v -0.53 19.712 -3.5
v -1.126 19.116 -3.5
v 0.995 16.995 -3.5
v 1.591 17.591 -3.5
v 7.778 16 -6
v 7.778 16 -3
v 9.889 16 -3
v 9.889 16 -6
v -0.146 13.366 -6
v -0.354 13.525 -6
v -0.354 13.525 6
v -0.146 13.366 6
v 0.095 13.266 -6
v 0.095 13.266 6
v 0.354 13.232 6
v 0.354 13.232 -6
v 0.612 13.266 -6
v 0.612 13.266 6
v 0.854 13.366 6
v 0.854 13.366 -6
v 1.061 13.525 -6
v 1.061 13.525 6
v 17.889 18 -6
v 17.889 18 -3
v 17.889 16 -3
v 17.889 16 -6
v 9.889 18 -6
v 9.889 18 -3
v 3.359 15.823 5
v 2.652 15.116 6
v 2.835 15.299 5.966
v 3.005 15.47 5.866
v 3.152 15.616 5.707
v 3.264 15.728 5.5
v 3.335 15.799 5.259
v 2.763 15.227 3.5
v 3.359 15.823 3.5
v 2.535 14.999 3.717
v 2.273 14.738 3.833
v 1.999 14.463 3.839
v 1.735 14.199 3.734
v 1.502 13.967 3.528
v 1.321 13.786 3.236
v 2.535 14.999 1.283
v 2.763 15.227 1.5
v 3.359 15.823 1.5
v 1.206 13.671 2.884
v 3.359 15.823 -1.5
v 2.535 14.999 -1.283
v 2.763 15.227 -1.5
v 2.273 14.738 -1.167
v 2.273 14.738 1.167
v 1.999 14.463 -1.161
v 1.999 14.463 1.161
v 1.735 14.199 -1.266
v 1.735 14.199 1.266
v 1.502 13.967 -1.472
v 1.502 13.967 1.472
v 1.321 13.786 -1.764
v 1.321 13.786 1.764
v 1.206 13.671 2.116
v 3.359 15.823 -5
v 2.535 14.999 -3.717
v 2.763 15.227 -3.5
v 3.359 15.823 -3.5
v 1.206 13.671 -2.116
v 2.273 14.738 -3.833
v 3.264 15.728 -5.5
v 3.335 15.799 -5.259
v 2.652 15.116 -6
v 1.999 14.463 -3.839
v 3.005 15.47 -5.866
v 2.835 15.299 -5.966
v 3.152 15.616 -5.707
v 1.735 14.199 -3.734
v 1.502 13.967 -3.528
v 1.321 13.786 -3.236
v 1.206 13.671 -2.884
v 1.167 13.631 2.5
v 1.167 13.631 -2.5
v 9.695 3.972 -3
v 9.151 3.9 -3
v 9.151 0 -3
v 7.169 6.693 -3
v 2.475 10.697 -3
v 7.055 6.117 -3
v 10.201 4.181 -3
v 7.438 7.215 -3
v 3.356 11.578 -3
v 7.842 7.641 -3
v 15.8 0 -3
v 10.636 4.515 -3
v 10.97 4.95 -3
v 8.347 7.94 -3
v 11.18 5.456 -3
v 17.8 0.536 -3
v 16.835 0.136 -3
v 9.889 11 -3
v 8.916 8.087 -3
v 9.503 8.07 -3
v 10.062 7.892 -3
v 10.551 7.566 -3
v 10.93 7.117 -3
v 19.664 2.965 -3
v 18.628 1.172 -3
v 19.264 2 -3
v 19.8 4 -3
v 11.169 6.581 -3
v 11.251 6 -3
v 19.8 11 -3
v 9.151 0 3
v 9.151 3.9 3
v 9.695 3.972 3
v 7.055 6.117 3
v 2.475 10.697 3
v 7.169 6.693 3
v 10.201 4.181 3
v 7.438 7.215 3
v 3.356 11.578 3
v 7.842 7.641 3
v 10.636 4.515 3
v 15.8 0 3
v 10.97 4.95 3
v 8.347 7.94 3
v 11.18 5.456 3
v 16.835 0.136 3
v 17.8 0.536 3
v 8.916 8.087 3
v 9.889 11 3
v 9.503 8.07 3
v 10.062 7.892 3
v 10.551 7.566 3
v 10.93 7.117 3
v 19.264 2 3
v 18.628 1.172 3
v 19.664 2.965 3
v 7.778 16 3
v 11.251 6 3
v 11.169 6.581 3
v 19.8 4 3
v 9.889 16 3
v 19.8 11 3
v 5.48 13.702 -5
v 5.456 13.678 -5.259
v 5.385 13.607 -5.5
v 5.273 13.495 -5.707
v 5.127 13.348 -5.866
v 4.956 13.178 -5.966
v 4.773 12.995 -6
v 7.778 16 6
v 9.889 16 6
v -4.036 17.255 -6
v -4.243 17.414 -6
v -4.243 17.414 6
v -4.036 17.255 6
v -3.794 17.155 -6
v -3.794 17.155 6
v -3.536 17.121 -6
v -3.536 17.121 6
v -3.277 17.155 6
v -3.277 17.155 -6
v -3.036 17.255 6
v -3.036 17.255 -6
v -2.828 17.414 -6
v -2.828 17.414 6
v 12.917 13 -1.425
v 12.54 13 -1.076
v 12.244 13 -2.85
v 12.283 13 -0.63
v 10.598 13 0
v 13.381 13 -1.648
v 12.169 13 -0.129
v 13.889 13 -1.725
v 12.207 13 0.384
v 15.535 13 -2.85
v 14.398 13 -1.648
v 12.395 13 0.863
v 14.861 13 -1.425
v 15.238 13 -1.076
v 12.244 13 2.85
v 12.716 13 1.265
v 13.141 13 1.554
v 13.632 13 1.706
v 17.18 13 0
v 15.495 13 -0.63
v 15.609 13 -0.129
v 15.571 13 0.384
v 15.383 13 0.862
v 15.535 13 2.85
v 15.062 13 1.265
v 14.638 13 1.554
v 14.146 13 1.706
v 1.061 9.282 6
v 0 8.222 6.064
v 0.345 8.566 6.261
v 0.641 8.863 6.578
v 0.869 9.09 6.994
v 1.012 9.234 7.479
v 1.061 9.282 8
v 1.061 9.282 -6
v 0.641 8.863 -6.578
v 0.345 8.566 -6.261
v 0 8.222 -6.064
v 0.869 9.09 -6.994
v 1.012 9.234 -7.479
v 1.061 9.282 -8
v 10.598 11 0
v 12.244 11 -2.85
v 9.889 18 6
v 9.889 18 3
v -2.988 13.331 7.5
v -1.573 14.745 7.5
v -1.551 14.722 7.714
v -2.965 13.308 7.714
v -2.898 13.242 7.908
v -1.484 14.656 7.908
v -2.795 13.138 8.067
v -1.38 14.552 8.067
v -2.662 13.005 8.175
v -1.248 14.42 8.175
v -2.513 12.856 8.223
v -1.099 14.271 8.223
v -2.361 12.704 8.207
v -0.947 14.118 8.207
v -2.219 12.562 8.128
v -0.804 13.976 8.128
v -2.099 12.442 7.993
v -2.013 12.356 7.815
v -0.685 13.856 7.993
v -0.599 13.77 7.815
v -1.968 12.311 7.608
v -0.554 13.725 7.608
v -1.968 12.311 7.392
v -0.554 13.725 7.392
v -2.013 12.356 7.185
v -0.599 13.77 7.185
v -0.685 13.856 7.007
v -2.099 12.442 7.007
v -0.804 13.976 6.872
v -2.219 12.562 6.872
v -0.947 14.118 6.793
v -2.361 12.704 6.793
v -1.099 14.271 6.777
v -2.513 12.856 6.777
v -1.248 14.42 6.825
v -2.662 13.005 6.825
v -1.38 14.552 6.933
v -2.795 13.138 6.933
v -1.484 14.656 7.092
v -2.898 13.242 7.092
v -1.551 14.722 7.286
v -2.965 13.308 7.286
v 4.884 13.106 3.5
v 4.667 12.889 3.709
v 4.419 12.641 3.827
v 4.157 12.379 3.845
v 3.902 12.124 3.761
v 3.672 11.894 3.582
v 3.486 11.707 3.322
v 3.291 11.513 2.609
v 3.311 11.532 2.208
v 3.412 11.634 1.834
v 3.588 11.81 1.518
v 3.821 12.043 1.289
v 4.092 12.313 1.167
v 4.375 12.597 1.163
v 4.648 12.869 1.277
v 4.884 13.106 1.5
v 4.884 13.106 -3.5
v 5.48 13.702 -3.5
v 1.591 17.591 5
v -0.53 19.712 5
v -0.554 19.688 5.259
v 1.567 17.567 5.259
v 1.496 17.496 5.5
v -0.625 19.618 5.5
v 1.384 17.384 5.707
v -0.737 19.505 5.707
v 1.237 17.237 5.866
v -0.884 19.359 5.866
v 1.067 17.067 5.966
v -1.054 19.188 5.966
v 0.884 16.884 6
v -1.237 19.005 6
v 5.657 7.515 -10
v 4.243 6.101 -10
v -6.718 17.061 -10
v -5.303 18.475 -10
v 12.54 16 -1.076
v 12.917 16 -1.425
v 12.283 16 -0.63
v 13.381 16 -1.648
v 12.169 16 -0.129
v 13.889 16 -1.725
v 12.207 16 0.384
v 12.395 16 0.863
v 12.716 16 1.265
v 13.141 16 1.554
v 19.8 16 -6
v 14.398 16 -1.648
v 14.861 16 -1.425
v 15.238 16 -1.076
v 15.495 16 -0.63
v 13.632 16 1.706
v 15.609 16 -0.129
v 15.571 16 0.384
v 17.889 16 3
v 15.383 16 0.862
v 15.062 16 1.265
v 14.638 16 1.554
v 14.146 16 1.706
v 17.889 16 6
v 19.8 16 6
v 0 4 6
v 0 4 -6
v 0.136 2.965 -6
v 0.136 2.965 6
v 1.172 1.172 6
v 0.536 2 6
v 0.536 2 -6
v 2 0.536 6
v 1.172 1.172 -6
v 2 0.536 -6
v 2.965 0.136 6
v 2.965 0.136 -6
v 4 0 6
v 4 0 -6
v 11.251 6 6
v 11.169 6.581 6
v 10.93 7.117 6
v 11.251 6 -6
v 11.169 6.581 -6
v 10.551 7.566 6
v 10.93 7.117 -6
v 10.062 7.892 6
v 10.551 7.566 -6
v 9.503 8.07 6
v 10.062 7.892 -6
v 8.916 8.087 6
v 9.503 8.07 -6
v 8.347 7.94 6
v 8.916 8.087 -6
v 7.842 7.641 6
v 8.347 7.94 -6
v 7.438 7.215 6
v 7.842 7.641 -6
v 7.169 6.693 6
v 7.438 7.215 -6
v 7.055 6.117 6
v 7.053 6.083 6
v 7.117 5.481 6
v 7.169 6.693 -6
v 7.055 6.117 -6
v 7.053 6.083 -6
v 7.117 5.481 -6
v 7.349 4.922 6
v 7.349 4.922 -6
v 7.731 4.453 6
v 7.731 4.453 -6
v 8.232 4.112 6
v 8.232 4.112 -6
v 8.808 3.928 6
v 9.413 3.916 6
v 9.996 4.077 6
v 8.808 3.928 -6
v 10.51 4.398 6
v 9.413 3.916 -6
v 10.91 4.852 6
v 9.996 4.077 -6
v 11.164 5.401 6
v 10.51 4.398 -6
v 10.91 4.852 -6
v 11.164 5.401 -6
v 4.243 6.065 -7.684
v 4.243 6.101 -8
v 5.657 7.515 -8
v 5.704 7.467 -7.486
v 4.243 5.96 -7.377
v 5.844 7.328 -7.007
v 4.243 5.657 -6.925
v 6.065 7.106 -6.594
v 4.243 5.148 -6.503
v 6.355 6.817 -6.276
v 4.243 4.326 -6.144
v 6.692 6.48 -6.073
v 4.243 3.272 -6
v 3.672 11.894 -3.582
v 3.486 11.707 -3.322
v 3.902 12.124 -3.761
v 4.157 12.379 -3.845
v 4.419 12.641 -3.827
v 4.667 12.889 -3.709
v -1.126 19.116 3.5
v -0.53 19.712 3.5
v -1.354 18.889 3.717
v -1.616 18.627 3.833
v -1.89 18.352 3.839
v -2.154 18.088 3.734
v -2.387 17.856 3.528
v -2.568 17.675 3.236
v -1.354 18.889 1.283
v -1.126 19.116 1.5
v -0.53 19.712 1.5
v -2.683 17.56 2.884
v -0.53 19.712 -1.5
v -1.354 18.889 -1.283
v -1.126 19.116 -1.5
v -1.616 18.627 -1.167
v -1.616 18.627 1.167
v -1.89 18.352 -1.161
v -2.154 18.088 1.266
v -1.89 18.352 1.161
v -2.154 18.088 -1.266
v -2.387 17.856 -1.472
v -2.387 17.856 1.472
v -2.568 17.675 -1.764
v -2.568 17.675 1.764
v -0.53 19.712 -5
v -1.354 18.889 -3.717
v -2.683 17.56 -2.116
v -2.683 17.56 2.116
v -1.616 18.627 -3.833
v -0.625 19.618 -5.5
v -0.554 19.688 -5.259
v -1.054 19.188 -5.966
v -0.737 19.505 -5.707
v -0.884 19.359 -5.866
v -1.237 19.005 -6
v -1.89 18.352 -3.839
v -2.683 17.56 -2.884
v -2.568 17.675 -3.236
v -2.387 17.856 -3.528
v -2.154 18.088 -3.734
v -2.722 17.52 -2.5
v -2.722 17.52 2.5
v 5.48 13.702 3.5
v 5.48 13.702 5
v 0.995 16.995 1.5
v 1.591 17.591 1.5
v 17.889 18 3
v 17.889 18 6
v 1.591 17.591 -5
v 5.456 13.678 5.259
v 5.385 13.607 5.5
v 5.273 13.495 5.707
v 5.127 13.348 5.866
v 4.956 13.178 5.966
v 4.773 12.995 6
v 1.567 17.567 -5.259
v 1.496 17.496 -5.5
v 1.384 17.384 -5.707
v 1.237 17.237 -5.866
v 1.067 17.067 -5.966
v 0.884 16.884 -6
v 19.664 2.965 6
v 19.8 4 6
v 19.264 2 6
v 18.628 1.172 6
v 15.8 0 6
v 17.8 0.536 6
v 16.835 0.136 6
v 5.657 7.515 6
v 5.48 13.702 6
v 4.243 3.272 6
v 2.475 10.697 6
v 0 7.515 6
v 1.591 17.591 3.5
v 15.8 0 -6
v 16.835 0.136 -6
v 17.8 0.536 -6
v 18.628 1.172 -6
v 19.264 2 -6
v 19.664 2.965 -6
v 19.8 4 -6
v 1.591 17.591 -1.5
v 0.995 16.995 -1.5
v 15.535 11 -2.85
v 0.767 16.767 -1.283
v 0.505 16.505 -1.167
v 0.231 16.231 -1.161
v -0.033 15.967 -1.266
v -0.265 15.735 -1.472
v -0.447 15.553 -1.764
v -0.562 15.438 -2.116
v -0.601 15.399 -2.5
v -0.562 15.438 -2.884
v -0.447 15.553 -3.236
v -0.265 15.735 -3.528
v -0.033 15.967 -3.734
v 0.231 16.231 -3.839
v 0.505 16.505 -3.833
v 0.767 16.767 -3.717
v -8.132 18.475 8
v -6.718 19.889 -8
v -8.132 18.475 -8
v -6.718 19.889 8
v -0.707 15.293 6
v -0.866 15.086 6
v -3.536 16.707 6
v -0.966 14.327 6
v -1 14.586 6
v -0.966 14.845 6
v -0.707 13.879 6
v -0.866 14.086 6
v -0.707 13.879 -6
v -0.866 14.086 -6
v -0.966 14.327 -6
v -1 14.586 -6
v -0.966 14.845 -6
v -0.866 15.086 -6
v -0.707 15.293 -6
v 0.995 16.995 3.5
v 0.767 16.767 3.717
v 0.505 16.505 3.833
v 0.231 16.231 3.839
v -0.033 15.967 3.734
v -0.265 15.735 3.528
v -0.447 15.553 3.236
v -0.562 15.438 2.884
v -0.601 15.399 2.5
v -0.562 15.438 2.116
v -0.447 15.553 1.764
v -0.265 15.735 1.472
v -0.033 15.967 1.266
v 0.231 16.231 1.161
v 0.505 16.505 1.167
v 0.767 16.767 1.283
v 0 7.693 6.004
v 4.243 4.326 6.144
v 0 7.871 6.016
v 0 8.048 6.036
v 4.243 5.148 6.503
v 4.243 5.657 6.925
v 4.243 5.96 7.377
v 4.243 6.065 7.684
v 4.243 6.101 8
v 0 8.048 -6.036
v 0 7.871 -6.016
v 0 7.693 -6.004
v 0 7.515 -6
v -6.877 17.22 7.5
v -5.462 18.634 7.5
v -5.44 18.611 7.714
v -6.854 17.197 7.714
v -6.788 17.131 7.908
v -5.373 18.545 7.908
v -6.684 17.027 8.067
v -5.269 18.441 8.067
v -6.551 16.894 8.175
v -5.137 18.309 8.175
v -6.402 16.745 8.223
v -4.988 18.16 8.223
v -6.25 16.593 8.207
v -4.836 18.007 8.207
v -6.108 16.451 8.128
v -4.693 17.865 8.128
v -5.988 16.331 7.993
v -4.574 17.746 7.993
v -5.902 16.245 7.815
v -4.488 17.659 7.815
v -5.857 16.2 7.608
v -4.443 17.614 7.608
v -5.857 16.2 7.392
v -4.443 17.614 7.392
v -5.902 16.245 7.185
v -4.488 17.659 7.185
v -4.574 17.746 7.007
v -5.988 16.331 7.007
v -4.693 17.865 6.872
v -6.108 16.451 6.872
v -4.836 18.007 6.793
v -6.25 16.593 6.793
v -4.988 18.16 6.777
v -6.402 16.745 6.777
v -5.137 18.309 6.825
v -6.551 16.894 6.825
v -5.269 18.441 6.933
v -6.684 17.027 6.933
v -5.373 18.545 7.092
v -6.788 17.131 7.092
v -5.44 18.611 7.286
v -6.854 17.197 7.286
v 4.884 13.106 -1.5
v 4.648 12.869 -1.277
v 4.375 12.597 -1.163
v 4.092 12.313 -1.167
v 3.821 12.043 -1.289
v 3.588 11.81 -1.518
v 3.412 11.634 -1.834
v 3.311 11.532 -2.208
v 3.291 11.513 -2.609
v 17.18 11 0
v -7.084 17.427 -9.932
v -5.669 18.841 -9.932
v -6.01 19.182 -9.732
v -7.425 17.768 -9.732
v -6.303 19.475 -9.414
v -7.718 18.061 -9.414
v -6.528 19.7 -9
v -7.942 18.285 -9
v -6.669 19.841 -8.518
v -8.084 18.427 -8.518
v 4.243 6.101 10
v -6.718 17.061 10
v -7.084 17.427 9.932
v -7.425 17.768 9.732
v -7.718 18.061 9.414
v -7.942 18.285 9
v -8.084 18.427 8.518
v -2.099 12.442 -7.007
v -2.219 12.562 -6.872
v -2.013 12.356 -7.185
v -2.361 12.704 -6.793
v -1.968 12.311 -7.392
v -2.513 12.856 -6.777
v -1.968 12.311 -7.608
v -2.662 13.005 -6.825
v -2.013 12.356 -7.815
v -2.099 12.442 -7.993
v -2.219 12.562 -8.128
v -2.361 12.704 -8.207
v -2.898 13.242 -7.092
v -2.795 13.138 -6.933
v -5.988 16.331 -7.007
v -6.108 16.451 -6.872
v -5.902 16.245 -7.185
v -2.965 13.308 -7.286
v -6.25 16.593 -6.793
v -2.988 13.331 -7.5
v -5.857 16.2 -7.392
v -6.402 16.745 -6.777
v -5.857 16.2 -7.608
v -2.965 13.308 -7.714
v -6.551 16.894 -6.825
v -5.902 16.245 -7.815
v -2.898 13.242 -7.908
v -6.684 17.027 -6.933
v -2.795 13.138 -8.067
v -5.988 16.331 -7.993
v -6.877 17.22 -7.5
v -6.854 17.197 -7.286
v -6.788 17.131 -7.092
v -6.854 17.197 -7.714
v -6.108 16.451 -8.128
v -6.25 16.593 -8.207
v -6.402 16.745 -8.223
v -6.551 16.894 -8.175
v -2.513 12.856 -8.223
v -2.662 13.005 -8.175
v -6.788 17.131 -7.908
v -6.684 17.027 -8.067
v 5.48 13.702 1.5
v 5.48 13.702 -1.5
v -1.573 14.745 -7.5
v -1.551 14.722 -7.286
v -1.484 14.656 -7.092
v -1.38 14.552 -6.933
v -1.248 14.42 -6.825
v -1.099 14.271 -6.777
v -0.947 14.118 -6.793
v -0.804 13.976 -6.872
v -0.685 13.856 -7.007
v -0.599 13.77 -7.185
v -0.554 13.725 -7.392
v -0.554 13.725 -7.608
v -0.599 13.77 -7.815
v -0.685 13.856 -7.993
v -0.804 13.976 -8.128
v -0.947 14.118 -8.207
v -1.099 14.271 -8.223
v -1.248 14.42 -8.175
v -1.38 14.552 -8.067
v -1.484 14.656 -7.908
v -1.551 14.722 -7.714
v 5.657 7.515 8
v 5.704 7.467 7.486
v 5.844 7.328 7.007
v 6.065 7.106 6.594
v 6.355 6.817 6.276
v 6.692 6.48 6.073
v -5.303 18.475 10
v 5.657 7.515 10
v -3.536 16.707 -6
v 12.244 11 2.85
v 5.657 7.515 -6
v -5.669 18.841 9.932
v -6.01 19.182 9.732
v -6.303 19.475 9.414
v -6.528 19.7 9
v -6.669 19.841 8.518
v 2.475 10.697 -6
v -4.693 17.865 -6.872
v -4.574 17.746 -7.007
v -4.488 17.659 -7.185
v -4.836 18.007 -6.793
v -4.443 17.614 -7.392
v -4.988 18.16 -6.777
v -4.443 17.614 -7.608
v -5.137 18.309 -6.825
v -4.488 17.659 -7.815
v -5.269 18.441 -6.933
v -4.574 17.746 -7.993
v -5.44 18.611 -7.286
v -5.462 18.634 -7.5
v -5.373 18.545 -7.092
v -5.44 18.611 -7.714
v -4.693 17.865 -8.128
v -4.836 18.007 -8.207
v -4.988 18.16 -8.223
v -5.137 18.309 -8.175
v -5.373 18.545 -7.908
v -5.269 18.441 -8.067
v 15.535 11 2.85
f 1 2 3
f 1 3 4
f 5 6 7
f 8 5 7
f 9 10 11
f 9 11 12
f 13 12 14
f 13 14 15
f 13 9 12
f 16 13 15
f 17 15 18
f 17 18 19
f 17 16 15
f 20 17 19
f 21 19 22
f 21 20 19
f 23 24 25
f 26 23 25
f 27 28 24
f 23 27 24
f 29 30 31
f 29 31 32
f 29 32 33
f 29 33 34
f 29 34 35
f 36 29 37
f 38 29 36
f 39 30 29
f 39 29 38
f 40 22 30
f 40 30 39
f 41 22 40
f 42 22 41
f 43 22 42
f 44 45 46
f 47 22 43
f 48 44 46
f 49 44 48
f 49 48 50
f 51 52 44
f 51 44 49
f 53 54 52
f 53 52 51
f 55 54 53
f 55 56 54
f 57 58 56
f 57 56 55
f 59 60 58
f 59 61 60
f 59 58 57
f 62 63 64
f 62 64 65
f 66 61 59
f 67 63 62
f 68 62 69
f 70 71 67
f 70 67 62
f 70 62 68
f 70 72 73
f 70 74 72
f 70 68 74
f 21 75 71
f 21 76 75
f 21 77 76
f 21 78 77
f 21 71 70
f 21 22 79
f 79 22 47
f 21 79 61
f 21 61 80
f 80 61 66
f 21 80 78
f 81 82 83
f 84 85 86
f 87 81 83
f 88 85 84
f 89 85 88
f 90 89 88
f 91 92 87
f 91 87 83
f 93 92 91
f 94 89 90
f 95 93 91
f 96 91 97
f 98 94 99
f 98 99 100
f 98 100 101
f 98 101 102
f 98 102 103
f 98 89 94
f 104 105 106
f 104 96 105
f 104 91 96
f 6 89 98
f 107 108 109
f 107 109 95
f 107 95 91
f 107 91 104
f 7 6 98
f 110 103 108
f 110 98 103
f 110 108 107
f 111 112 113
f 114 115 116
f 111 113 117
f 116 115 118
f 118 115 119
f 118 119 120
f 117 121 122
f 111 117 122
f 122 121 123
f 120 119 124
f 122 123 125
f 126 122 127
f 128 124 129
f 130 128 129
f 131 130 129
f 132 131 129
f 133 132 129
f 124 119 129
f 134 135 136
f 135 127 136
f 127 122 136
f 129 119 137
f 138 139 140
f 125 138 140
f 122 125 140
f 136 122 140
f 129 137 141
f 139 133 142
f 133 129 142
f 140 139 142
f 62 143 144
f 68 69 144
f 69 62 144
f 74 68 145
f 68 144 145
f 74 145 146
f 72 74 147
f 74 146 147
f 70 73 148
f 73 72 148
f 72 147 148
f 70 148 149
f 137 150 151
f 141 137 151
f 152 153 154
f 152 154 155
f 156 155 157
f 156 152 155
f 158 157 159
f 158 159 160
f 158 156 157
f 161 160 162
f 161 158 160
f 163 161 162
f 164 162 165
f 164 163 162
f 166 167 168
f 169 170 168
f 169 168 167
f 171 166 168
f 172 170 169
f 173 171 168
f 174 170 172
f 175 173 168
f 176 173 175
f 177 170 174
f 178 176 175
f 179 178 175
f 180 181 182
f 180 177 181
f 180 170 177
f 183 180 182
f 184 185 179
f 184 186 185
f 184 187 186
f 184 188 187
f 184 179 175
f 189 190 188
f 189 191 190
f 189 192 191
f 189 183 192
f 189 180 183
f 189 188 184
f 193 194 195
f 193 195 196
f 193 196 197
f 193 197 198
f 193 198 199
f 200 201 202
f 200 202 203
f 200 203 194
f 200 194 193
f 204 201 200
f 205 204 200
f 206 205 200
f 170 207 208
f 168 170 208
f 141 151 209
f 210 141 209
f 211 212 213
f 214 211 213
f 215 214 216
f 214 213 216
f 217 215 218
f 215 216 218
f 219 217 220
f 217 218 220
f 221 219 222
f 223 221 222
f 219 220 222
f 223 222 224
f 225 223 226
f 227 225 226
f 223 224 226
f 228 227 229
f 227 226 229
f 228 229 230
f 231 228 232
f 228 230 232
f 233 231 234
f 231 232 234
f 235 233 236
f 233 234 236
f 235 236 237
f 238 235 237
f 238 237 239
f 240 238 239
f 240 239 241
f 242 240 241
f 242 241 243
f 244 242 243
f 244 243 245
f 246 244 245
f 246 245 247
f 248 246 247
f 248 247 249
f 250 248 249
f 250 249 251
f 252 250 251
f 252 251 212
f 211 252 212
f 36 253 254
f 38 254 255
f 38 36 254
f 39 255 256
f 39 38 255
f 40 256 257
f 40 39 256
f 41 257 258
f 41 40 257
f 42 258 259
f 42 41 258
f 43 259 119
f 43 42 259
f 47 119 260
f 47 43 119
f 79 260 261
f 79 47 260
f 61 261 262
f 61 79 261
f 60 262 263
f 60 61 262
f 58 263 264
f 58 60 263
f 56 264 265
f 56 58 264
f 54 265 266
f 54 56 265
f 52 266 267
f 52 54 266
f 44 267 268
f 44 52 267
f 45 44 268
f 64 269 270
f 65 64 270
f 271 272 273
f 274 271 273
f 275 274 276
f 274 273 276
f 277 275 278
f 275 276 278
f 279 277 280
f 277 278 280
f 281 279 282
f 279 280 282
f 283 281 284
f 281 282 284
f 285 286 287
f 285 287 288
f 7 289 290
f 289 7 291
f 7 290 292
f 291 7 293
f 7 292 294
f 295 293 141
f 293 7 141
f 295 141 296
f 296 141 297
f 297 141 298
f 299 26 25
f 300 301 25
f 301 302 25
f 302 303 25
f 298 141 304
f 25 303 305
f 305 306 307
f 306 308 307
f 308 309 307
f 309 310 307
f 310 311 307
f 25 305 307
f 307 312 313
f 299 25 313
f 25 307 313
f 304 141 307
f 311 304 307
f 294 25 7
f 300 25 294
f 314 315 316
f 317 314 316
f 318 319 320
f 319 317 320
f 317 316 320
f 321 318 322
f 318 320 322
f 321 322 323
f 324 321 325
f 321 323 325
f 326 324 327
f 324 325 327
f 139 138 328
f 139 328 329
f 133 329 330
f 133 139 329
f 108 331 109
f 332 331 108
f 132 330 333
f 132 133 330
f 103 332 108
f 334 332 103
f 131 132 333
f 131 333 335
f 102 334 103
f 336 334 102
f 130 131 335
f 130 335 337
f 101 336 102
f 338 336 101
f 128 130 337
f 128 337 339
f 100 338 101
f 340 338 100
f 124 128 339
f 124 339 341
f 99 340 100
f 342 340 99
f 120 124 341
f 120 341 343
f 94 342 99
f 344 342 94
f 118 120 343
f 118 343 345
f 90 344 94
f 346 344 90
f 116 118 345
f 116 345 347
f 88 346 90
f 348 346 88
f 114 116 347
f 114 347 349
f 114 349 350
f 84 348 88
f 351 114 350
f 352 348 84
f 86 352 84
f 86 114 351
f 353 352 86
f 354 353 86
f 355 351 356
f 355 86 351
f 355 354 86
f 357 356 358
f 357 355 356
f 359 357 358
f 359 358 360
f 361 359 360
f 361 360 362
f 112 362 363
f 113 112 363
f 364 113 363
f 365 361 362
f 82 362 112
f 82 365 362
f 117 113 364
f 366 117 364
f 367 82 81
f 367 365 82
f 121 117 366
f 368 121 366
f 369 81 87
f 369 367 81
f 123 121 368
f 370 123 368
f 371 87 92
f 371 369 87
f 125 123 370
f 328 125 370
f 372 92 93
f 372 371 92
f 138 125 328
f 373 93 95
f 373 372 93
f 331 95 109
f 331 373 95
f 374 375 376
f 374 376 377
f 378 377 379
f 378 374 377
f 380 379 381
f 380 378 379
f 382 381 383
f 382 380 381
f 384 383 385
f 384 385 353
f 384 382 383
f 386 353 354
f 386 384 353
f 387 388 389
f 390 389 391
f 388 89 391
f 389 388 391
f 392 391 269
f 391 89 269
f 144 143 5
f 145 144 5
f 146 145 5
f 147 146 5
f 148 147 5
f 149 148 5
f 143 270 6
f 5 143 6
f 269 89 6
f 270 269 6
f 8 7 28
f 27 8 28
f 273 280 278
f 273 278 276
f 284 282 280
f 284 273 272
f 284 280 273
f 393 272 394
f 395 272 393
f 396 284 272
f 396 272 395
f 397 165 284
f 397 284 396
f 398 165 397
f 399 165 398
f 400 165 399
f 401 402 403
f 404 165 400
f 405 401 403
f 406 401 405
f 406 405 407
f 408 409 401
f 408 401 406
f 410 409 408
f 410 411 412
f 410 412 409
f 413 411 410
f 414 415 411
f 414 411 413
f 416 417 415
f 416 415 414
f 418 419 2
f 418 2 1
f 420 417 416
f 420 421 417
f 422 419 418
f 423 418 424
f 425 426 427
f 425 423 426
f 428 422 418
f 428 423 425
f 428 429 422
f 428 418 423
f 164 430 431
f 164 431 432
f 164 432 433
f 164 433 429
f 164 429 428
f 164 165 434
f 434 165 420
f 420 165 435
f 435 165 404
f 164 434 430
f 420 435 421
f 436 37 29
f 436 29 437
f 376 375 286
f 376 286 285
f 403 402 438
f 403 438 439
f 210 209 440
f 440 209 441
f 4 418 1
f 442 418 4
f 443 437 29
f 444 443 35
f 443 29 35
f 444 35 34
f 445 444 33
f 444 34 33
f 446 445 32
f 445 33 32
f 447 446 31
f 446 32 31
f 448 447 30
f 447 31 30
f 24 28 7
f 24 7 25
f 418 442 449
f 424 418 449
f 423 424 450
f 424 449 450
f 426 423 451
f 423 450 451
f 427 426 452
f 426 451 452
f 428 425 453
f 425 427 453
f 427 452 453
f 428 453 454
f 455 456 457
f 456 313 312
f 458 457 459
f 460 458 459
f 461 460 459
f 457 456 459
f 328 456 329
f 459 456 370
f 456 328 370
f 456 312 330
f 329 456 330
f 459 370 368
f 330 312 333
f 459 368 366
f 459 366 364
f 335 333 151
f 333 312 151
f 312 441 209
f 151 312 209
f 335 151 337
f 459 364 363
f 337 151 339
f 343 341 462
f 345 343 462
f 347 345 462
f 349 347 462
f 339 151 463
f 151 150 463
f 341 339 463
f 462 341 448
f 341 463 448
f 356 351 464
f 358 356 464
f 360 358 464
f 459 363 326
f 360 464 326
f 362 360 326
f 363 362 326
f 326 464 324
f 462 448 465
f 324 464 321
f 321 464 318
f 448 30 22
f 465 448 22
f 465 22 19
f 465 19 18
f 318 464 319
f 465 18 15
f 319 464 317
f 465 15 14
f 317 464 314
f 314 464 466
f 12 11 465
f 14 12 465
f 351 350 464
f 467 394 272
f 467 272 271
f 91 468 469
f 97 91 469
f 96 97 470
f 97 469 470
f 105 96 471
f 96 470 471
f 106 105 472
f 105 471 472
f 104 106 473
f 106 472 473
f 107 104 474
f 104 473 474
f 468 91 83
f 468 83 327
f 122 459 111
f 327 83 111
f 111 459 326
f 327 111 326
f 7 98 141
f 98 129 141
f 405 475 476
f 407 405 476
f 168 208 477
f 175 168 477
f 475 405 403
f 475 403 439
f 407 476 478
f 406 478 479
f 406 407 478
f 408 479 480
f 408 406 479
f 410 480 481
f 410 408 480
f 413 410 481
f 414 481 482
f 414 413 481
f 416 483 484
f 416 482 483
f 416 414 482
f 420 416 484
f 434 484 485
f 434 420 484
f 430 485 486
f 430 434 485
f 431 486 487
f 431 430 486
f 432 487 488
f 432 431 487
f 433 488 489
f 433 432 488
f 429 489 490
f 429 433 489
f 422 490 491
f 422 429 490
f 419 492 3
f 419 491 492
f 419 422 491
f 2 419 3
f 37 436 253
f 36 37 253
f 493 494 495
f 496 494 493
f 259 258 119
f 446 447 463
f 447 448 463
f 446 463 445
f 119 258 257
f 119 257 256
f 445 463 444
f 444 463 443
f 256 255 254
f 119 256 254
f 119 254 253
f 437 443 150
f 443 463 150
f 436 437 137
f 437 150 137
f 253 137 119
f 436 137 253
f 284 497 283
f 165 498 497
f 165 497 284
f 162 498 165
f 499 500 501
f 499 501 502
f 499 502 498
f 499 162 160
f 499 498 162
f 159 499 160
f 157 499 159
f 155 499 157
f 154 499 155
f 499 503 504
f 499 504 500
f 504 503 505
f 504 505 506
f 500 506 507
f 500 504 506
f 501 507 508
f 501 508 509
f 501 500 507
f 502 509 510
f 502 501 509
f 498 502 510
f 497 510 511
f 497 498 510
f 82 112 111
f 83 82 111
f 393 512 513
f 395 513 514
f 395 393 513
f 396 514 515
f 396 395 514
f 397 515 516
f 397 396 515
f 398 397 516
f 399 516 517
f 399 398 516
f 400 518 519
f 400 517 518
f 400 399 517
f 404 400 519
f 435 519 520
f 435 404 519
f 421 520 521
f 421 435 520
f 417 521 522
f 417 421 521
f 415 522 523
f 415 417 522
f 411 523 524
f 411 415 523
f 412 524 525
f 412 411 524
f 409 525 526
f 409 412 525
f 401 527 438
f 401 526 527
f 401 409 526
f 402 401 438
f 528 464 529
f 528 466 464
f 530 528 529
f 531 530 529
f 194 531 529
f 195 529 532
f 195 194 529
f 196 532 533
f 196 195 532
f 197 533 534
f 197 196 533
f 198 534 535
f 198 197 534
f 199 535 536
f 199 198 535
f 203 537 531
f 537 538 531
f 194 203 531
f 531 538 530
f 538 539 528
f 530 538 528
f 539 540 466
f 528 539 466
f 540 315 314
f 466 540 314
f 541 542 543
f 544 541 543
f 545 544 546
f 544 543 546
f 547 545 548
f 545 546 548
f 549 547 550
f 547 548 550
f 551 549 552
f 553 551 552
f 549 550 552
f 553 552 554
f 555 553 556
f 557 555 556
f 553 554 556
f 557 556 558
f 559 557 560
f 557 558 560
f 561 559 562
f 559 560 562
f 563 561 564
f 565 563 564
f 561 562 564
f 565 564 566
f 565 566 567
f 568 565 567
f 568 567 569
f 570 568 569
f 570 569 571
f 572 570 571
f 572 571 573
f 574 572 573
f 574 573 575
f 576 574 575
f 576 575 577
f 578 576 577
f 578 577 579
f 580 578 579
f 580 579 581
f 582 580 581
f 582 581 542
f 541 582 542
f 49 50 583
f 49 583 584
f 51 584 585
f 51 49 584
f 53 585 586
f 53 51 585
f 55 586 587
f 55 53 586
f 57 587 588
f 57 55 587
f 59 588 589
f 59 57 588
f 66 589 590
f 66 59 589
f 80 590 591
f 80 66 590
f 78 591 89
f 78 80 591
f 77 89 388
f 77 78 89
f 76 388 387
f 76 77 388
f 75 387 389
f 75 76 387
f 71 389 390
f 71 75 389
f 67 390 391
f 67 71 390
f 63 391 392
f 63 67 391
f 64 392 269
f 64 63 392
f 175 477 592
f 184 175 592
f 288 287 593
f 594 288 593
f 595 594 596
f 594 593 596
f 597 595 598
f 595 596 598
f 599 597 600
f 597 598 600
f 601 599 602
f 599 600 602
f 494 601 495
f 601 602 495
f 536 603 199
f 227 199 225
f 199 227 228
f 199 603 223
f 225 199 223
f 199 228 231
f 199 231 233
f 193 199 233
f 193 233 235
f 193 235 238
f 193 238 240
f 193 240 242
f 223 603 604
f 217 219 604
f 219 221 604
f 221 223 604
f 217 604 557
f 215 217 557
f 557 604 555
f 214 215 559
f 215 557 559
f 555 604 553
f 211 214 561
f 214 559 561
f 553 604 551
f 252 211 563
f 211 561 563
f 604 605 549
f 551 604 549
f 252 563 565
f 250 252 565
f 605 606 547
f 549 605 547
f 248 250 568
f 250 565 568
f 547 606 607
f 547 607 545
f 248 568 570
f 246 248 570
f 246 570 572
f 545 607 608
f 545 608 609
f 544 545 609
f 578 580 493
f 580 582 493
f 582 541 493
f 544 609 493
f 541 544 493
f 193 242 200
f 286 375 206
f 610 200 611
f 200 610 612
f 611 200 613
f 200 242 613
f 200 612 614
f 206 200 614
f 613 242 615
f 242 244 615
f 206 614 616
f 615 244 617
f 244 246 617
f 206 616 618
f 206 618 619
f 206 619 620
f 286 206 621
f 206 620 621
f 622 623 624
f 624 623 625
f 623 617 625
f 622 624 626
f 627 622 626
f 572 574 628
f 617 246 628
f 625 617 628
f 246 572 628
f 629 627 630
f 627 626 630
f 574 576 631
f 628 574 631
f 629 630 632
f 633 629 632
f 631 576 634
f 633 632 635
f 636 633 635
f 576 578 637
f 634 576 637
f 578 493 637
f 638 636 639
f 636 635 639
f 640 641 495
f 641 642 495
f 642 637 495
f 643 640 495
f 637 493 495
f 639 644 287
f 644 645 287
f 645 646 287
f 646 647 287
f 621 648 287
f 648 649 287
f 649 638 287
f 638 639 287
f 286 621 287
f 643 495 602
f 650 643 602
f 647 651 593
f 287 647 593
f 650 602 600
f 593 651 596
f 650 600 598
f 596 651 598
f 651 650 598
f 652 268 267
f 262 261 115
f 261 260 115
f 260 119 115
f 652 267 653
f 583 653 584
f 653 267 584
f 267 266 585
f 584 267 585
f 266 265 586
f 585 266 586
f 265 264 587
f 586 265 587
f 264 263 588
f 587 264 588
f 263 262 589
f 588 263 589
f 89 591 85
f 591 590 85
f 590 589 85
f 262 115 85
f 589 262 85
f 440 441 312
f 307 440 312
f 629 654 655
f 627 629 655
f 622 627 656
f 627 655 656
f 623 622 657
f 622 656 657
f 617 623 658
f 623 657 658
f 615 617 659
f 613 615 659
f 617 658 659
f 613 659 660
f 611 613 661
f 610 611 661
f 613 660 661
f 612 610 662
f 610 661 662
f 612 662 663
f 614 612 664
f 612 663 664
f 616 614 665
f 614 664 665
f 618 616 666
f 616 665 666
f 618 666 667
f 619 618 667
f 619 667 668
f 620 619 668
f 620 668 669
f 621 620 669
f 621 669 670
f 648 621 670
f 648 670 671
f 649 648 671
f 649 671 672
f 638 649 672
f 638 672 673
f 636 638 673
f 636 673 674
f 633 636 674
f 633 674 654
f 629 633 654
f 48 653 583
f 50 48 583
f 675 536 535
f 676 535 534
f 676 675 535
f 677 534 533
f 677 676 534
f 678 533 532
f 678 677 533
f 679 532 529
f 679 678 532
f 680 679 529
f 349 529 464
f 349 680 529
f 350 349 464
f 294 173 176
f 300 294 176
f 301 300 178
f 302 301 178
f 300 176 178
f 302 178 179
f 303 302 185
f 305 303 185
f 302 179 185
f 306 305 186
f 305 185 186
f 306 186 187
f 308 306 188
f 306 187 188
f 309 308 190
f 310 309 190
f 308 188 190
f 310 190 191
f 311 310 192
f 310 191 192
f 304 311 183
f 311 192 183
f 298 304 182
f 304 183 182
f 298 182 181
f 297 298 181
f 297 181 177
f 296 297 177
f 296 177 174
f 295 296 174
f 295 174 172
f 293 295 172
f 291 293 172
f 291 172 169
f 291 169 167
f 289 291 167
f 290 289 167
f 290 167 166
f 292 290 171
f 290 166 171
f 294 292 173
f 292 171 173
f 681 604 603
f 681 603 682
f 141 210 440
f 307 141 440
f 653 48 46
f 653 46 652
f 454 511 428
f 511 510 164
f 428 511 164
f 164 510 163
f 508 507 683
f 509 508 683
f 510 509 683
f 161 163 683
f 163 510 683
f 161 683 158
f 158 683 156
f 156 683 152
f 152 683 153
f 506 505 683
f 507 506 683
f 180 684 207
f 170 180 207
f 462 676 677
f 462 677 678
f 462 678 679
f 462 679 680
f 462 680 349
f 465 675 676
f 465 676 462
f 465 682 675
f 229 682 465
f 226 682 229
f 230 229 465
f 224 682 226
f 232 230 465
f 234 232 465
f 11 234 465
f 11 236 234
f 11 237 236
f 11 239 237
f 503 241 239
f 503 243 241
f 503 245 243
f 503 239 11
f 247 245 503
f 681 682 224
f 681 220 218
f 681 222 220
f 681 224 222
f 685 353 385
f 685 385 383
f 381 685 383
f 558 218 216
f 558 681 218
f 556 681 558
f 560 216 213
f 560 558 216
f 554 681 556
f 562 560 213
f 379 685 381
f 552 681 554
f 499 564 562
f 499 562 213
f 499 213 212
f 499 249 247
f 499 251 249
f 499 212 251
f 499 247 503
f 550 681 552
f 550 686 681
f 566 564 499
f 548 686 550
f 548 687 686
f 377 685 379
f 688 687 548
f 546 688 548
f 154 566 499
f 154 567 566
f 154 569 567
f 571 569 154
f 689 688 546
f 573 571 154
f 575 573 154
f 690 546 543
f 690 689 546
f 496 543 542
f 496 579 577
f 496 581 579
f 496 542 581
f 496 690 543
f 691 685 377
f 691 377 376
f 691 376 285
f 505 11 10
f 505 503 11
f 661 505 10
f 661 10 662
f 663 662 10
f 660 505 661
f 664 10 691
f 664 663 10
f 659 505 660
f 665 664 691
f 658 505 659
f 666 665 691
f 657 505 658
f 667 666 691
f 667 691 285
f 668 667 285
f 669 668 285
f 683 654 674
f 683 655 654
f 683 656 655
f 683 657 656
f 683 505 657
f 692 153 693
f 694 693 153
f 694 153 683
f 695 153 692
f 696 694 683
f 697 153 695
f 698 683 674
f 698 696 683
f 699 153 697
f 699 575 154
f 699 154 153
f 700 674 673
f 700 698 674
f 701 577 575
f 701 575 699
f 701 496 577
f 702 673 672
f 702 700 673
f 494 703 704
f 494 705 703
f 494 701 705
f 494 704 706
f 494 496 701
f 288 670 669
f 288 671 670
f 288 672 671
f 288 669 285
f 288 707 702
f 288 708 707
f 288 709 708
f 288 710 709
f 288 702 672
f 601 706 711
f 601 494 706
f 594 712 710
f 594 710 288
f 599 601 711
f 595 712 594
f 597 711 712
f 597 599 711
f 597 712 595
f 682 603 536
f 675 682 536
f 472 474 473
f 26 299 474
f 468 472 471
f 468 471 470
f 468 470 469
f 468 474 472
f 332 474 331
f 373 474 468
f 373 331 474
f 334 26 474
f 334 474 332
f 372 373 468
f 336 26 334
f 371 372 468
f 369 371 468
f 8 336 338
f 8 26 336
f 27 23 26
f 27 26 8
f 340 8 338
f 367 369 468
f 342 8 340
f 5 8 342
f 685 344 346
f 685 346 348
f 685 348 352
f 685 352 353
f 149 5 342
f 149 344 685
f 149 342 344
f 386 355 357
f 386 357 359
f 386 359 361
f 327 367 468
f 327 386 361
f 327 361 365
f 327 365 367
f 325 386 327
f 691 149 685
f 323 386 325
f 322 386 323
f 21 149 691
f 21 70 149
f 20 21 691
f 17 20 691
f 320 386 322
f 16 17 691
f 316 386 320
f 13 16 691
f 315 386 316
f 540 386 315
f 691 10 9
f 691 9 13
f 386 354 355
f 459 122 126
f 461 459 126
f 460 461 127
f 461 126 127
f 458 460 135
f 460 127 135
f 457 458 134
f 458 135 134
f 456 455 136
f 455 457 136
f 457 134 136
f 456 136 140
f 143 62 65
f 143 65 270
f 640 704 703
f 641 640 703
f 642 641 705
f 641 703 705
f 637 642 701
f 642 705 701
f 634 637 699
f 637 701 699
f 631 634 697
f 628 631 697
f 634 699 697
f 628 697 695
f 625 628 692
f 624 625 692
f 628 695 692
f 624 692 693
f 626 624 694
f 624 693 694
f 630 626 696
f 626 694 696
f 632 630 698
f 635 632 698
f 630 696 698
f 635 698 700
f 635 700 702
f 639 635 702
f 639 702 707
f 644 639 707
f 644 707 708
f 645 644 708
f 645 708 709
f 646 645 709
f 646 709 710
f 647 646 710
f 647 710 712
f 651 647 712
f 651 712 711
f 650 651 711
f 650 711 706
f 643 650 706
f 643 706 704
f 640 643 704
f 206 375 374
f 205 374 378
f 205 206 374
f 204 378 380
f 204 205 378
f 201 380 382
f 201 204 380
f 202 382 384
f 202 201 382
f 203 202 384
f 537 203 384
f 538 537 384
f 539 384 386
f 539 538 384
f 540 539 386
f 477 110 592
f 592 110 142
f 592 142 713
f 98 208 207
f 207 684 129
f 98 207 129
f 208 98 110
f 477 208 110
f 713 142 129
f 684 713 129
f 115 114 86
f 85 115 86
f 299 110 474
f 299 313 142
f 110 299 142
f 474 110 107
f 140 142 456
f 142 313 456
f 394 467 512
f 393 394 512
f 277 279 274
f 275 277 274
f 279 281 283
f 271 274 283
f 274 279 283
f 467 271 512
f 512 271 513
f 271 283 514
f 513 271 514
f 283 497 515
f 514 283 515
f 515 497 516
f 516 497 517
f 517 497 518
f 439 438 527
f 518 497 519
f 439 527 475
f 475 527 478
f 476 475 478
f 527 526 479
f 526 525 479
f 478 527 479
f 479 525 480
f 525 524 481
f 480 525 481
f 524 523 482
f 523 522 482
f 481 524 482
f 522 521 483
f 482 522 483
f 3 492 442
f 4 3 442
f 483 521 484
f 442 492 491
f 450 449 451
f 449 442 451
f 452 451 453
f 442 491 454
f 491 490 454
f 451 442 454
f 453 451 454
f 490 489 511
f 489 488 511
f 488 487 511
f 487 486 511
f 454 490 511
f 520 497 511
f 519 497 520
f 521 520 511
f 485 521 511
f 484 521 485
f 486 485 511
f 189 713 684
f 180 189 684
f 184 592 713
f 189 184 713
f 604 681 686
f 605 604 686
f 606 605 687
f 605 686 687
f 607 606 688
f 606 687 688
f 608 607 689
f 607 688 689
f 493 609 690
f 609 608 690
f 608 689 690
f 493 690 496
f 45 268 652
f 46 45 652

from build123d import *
from build123d.topology import SkipClean

# Parameters (mm, degrees)
SKETCH1_R                        = 2.1
FINGER_BASE_1_DEPTH              = 6
SKETCH2_W                        = 20
SKETCH2_H                        = 2
FLEXURE_JOINT_BASE_DEPTH         = 13
SKETCH3_W                        = 8
SKETCH3_H                        = 2
PULLEY_HOUSING_DEPTH             = 3
M3_NUT_DEPTH                     = 2
SKETCH5_R                        = 1.725
M3_HOLE_DEPTH                    = 3
SKETCH9_W                        = 4
SKETCH9_H                        = 2
SUPPORT_FLEXURE_JOINT_BASE_DEPTH = 4.5
SKETCH10_R                       = 0.725
HOLE_FOR_STICHING_DEPTH          = 23.216728933
SKETCH11_W                       = 3
SKETCH11_H                       = 12
TUBE_PLATE_DEPTH                 = 4.25
TUBE_HOUSING_REACH               = 35.132
FINGER_BASE_CONTOURING_R         = 1
FINGER_BASE_CONTOURING_R_2       = 2
FINGER_BASE_CONTOURING_R_3       = 4


with BuildPart() as part:
    # Sketch1 → Finger Base 1 (new, symmetric)
    with BuildSketch(Plane.XY):
        Polygon((0, 8.221825407), (7.778174593, 16), (9.889087297, 16), (9.889087297, 18), (17.889087297, 18), (17.889087297, 16), (19.8, 16), (19.8, 0), (0, 0), align=None)
        with Locations((9.151471863, 6)):
            Circle(SKETCH1_R, mode=Mode.SUBTRACT)
    extrude(amount=FINGER_BASE_1_DEPTH, both=True)

    # Sketch2 → Flexure Joint Base (add)
    with BuildSketch(Plane(origin=(-4.110912703, 4.110912703, 0), x_dir=(0, 0, 1), z_dir=(-0.7071067811865462, 0.707106781186549, 0))):
        with Locations((0, 8.313708499)):
            Rectangle(SKETCH2_W, SKETCH2_H)
    extrude(amount=FLEXURE_JOINT_BASE_DEPTH)

    # Sketch3 → Pulley Housing (cut, symmetric)
    with SkipClean():  # the faces are left unmerged after this step: merging them gives an invalid solid
        with BuildSketch(Plane.XY):
            with BuildLine():
                ThreePointArc((7.054725188, 6.116847687), (7.62579494, 4.556978889), (9.151471863, 3.9))
                Line((9.151471863, 3.9), (9.151471863, 0))
                Line((9.151471863, 0), (19.8, 0))
                Line((19.8, 0), (19.8, 11))
                Line((19.8, 11), (9.889087297, 11))
                Line((9.889087297, 11), (9.889087297, 16))
                Line((9.889087297, 16), (7.778174593, 16))
                Line((7.778174593, 16), (2.474873734, 10.696699141))
                Line((2.474873734, 10.696699141), (7.054725188, 6.116847687))
            make_face()
            with Locations((13.889087297, 17)):
                Rectangle(SKETCH3_W, SKETCH3_H)
        extrude(amount=PULLEY_HOUSING_DEPTH, both=True, mode=Mode.SUBTRACT)
    add(part.part.scale(1), mode=Mode.REPLACE)  # the faces are merged on a copy

    # Sketch4 → M3 Nut (cut)
    with BuildSketch(Plane.XZ.offset(-11)):
        Polygon((10.598190762, 0), (12.243639029, -2.85), (15.534535564, -2.85), (17.179983831, 0), (15.534535564, 2.85), (12.243639029, 2.85), align=None)
    extrude(amount=-M3_NUT_DEPTH, mode=Mode.SUBTRACT)

    # Sketch5 → M3 Hole (cut)
    with BuildSketch(Plane.XZ.offset(-13)):
        with Locations(Location((13.889087297, 0, 0), (0, 0, 270))):
            Circle(SKETCH5_R)
    extrude(amount=-M3_HOLE_DEPTH, mode=Mode.SUBTRACT)

    # Sketch9 → Support Flexure Joint Base (add)
    with BuildSketch(Plane(origin=(-4.110912703, 4.110912703, 0), x_dir=(0, 0, -1), z_dir=(0.7071067811865462, -0.7071067811865488, 0))):
        with Locations((-8, 8.313708499)):
            Rectangle(SKETCH9_W, SKETCH9_H)
        with Locations((8, 8.313708499)):
            Rectangle(SKETCH9_W, SKETCH9_H)
    extrude(amount=SUPPORT_FLEXURE_JOINT_BASE_DEPTH)

    # Sketch10 → Hole For Stiching (cut, through all)
    with BuildSketch(Plane(origin=(6.585786438, 6.585786438, 0), x_dir=(0.7071067811865462, -0.707106781186549, 0), z_dir=(0.707106781186549, 0.7071067811865462, 0))):
        with Locations(Location((-16.313708499, -7.5, 0), (0, 0, 180))):
            Circle(SKETCH10_R)
        with Locations(Location((-10.813708499, -7.5, 0), (0, 0, 180))):
            Circle(SKETCH10_R)
        with Locations(Location((-10.813708499, 7.5, 0), (0, 0, 180))):
            Circle(SKETCH10_R)
        with Locations(Location((-16.313708499, 7.5, 0), (0, 0, 180))):
            Circle(SKETCH10_R)
    extrude(amount=-HOLE_FOR_STICHING_DEPTH, mode=Mode.SUBTRACT)

    # Sketch11 → Tube Plate (add)
    with BuildSketch(Plane(origin=(6.585786438, 6.585786438, 0), x_dir=(0.7071067811865462, -0.707106781186549, 0), z_dir=(0.707106781186549, 0.7071067811865462, 0))):
        with Locations((-12.813708499, 0)):
            Rectangle(SKETCH11_W, SKETCH11_H)
        with Locations((-7.313708499, 0)):
            Rectangle(SKETCH11_W, SKETCH11_H)
    extrude(amount=TUBE_PLATE_DEPTH)

    # Tube Housing: up to this face of the body (flat: up to its plane)
    tube_housing_end = Plane(part.part.faces().sort_by_distance((3.977475644, 12.199301051, 0))[0])
    # Sketch12 → Tube Housing (cut, up to the picked face)
    with BuildSketch(Plane(origin=(-10.121320344, 10.121320344, 0), x_dir=(0, 0, 1), z_dir=(-0.7071067811865462, 0.707106781186549, 0)), mode=Mode.PRIVATE) as tube_housing_sk1:
        with BuildLine():
            Line((-3.5, 13.563708499), (-1.5, 13.563708499))
            Line((-1.5, 13.563708499), (-1.5, 12.720626356))
            ThreePointArc((-1.5, 12.720626356), (-2.5, 10.463708499), (-3.5, 12.720626356))
            Line((-3.5, 12.720626356), (-3.5, 13.563708499))
        make_face()
    tube_housing_tool1 = split(extrude(tube_housing_sk1.sketch, amount=-TUBE_HOUSING_REACH, mode=Mode.PRIVATE), bisect_by=tube_housing_end, keep=Keep.BOTH, mode=Mode.PRIVATE)
    # Sketch12 → Tube Housing (cut, up to the picked face)
    with BuildSketch(Plane(origin=(-10.121320344, 10.121320344, 0), x_dir=(0, 0, 1), z_dir=(-0.7071067811865462, 0.707106781186549, 0)), mode=Mode.PRIVATE) as tube_housing_sk2:
        with BuildLine():
            Line((1.5, 12.720626356), (1.5, 13.563708499))
            Line((1.5, 13.563708499), (3.5, 13.563708499))
            Line((3.5, 13.563708499), (3.5, 12.720626356))
            ThreePointArc((3.5, 12.720626356), (2.5, 10.463708499), (1.5, 12.720626356))
        make_face()
    tube_housing_tool2 = split(extrude(tube_housing_sk2.sketch, amount=-TUBE_HOUSING_REACH, mode=Mode.PRIVATE), bisect_by=tube_housing_end, keep=Keep.BOTH, mode=Mode.PRIVATE)
    add(tube_housing_tool1.solids().sort_by(Axis((-1.604122, 18.638518, -2.5), (0.7071067811865462, -0.707106781186549, 0)))[0], mode=Mode.SUBTRACT)
    add(tube_housing_tool2.solids().sort_by(Axis((-1.604122, 18.638518, 2.5), (0.7071067811865462, -0.707106781186549, 0)))[0], mode=Mode.SUBTRACT)

    # Finger Base Contouring
    # the kernel refuses this fillet: 4, 2, 1 mm, written as the material it adds along each edge
    with BuildSketch(Plane(origin=(-1.414213562, 14.585786438, 6), x_dir=(0.7071067811865426, -0.7071067811865525, 0), z_dir=(0, 0, -1)), Plane(origin=(-3.535533906, 16.707106781, -6), x_dir=(-0.7071067811865498, 0.7071067811865454, 0), z_dir=(0, 0, 1))) as finger_base_contouring_piece_1:
        with BuildLine():
            CenterArc((FINGER_BASE_CONTOURING_R, -FINGER_BASE_CONTOURING_R), FINGER_BASE_CONTOURING_R, 90, 90)
            Line((0, -FINGER_BASE_CONTOURING_R), (0, 0))
            Line((0, 0), (FINGER_BASE_CONTOURING_R, 0))
        make_face()
    extrude(amount=12)
    with BuildSketch(Plane(origin=(0.353553391, 12.818019485, -6), x_dir=(0.7071067811865487, 0.7071067811865465, 0), z_dir=(0, 0, 1))) as finger_base_contouring_piece_2:
        with BuildLine():
            CenterArc((FINGER_BASE_CONTOURING_R, FINGER_BASE_CONTOURING_R), FINGER_BASE_CONTOURING_R, 180, 90)
            Line((0, FINGER_BASE_CONTOURING_R), (0, 0))
            Line((0, 0), (FINGER_BASE_CONTOURING_R, 0))
        make_face()
    extrude(amount=12)
    with BuildSketch(Plane(origin=(1.060660172, 9.282485579, 6), x_dir=(0, 0, 1), z_dir=(0.7071067811865462, -0.7071067811865488, 0))) as finger_base_contouring_piece_3_section:
        with BuildLine():
            CenterArc((FINGER_BASE_CONTOURING_R_2, FINGER_BASE_CONTOURING_R_2), FINGER_BASE_CONTOURING_R_2, 180, 90)
            Line((0, FINGER_BASE_CONTOURING_R_2), (0, 0))
            Line((0, 0), (FINGER_BASE_CONTOURING_R_2, 0))
        make_face()
    finger_base_contouring_piece_3 = extrude(amount=4.5, mode=Mode.PRIVATE)
    finger_base_contouring_piece_3 = split(finger_base_contouring_piece_3, bisect_by=Plane(origin=(0, 9.282485579, 6), z_dir=(1, 0, 0)), keep=Keep.TOP, mode=Mode.PRIVATE)
    add(finger_base_contouring_piece_3)
    with BuildSketch(Plane(origin=(5.656854249, 7.514718626, 6), x_dir=(0, 0, 1), z_dir=(-0.7071067811865488, -0.7071067811865462, 0))) as finger_base_contouring_piece_4_section:
        with BuildLine():
            CenterArc((FINGER_BASE_CONTOURING_R_2, -FINGER_BASE_CONTOURING_R_2), FINGER_BASE_CONTOURING_R_2, 90, 90)
            Line((0, -FINGER_BASE_CONTOURING_R_2), (0, 0))
            Line((0, 0), (FINGER_BASE_CONTOURING_R_2, 0))
        make_face()
    finger_base_contouring_piece_4 = extrude(amount=2, mode=Mode.PRIVATE)
    finger_base_contouring_piece_4 = finger_base_contouring_piece_4 - Plane(origin=(9.151471863, 6, 6), x_dir=(1, 0, 0), z_dir=(0, 0, -1)) * Cylinder(2.1, 12, mode=Mode.PRIVATE)
    add(finger_base_contouring_piece_4)
    with BuildSketch(Plane(origin=(1.060660172, 9.282485579, -6), x_dir=(-0.7071067811865489, -0.7071067811865462, 0), z_dir=(0.7071067811865462, -0.7071067811865488, 0))) as finger_base_contouring_piece_5_section:
        with BuildLine():
            CenterArc((FINGER_BASE_CONTOURING_R_2, FINGER_BASE_CONTOURING_R_2), FINGER_BASE_CONTOURING_R_2, 180, 90)
            Line((0, FINGER_BASE_CONTOURING_R_2), (0, 0))
            Line((0, 0), (FINGER_BASE_CONTOURING_R_2, 0))
        make_face()
    finger_base_contouring_piece_5 = extrude(amount=4.5, mode=Mode.PRIVATE)
    finger_base_contouring_piece_5 = split(finger_base_contouring_piece_5, bisect_by=Plane(origin=(0, 9.282485579, -6), z_dir=(1, 0, 0)), keep=Keep.TOP, mode=Mode.PRIVATE)
    add(finger_base_contouring_piece_5)
    with BuildSketch(Plane(origin=(4.242640687, 6.100505063, -6), x_dir=(0.7071067811865464, -0.7071067811865488, 0), z_dir=(0.7071067811865488, 0.7071067811865462, 0))) as finger_base_contouring_piece_6_section:
        with BuildLine():
            CenterArc((FINGER_BASE_CONTOURING_R_2, FINGER_BASE_CONTOURING_R_2), FINGER_BASE_CONTOURING_R_2, 180, 90)
            Line((0, FINGER_BASE_CONTOURING_R_2), (0, 0))
            Line((0, 0), (FINGER_BASE_CONTOURING_R_2, 0))
        make_face()
    finger_base_contouring_piece_6 = extrude(amount=2, mode=Mode.PRIVATE)
    finger_base_contouring_piece_6 = finger_base_contouring_piece_6 - Plane(origin=(9.151471863, 6, -6), x_dir=(1, 0, 0), z_dir=(0, 0, -1)) * Cylinder(2.1, 13, mode=Mode.PRIVATE)
    add(finger_base_contouring_piece_6)
    with BuildSketch(Plane(origin=(5.656854249, 7.514718626, 6), x_dir=(0, 0, 1), z_dir=(-0.7071067811865488, -0.7071067811865462, 0))) as finger_base_contouring_piece_7a_section:
        with BuildLine():
            CenterArc((FINGER_BASE_CONTOURING_R_2, -FINGER_BASE_CONTOURING_R_2), FINGER_BASE_CONTOURING_R_2, 90, 90)
            Line((0, -FINGER_BASE_CONTOURING_R_2), (0, 0))
            Line((0, 0), (FINGER_BASE_CONTOURING_R_2, 0))
        make_face()
    finger_base_contouring_piece_7a = extrude(amount=7, mode=Mode.PRIVATE)
    finger_base_contouring_piece_7a = split(finger_base_contouring_piece_7a, bisect_by=Plane(origin=(4.242640687, 6.100505063, 6), z_dir=(-0.7071067811865489, -0.7071067811865461, 0)), keep=Keep.TOP, mode=Mode.PRIVATE)
    with BuildSketch(Plane(origin=(1.060660172, 9.282485579, 6), x_dir=(0, 0, 1), z_dir=(0.7071067811865462, -0.7071067811865488, 0))) as finger_base_contouring_piece_7b_section:
        with BuildLine():
            CenterArc((FINGER_BASE_CONTOURING_R_2, FINGER_BASE_CONTOURING_R_2), FINGER_BASE_CONTOURING_R_2, 180, 90)
            Line((0, FINGER_BASE_CONTOURING_R_2), (0, 0))
            Line((0, 0), (FINGER_BASE_CONTOURING_R_2, 0))
        make_face()
    finger_base_contouring_piece_7b = extrude(amount=9.5, mode=Mode.PRIVATE)
    finger_base_contouring_piece_7b = split(finger_base_contouring_piece_7b, bisect_by=Plane(origin=(4.242640687, 6.100505063, 6), z_dir=(0.7071067811865462, -0.7071067811865488, 0)), keep=Keep.TOP, mode=Mode.PRIVATE)
    finger_base_contouring_piece_7 = finger_base_contouring_piece_7a & finger_base_contouring_piece_7b
    add(finger_base_contouring_piece_7)
    with BuildSketch(Plane(origin=(1.060660172, 9.282485579, -6), x_dir=(-0.7071067811865489, -0.7071067811865462, 0), z_dir=(0.7071067811865462, -0.7071067811865488, 0))) as finger_base_contouring_piece_8a_section:
        with BuildLine():
            CenterArc((FINGER_BASE_CONTOURING_R_2, FINGER_BASE_CONTOURING_R_2), FINGER_BASE_CONTOURING_R_2, 180, 90)
            Line((0, FINGER_BASE_CONTOURING_R_2), (0, 0))
            Line((0, 0), (FINGER_BASE_CONTOURING_R_2, 0))
        make_face()
    finger_base_contouring_piece_8a = extrude(amount=9.5, mode=Mode.PRIVATE)
    finger_base_contouring_piece_8a = split(finger_base_contouring_piece_8a, bisect_by=Plane(origin=(4.242640687, 6.100505063, -6), z_dir=(0.7071067811865462, -0.7071067811865488, 0)), keep=Keep.TOP, mode=Mode.PRIVATE)
    with BuildSketch(Plane(origin=(0.707106781, 2.564971157, -6), x_dir=(0.7071067811865464, -0.7071067811865488, 0), z_dir=(0.7071067811865488, 0.7071067811865462, 0))) as finger_base_contouring_piece_8b_section:
        with BuildLine():
            CenterArc((FINGER_BASE_CONTOURING_R_2, FINGER_BASE_CONTOURING_R_2), FINGER_BASE_CONTOURING_R_2, 180, 90)
            Line((0, FINGER_BASE_CONTOURING_R_2), (0, 0))
            Line((0, 0), (FINGER_BASE_CONTOURING_R_2, 0))
        make_face()
    finger_base_contouring_piece_8b = extrude(amount=7, mode=Mode.PRIVATE)
    finger_base_contouring_piece_8b = split(finger_base_contouring_piece_8b, bisect_by=Plane(origin=(4.242640687, 6.100505063, -6), z_dir=(-0.7071067811865489, -0.7071067811865461, 0)), keep=Keep.TOP, mode=Mode.PRIVATE)
    finger_base_contouring_piece_8 = finger_base_contouring_piece_8a & finger_base_contouring_piece_8b
    add(finger_base_contouring_piece_8)
    # the kernel refuses this fillet: 4, 2, 1 mm, written as the material it takes off along each edge
    with BuildSketch(Plane(origin=(3.358757211, 15.823223305, -6), x_dir=(0, 0, 1), z_dir=(-0.7071067811865462, 0.707106781186549, 0))) as finger_base_contouring_2_piece_1:
        with BuildLine():
            CenterArc((FINGER_BASE_CONTOURING_R, -FINGER_BASE_CONTOURING_R), FINGER_BASE_CONTOURING_R, 90, 90)
            Line((0, -FINGER_BASE_CONTOURING_R), (0, 0))
            Line((0, 0), (FINGER_BASE_CONTOURING_R, 0))
        make_face()
    extrude(amount=8, mode=Mode.SUBTRACT)
    with BuildSketch(Plane(origin=(-2.298097039, 21.480077554, 6), x_dir=(-0.707106781186549, -0.7071067811865461, 0), z_dir=(0.7071067811865462, -0.707106781186549, 0))) as finger_base_contouring_2_piece_2:
        with BuildLine():
            CenterArc((FINGER_BASE_CONTOURING_R, FINGER_BASE_CONTOURING_R), FINGER_BASE_CONTOURING_R, 180, 90)
            Line((0, FINGER_BASE_CONTOURING_R), (0, 0))
            Line((0, 0), (FINGER_BASE_CONTOURING_R, 0))
        make_face()
    extrude(amount=8, mode=Mode.SUBTRACT)
    with BuildSketch(Plane(origin=(5.480077554, 13.701902961, -6), x_dir=(-0.7071067811865489, -0.7071067811865462, -1.776356839400251e-15), z_dir=(-0.7071067811865462, 0.707106781186549, 0)), Plane(origin=(1.590990258, 17.590990258, 6), x_dir=(-0.7071067811865489, -0.7071067811865462, -1.776356839400251e-15), z_dir=(0.7071067811865462, -0.707106781186549, 0))) as finger_base_contouring_2_piece_3:
        with BuildLine():
            CenterArc((FINGER_BASE_CONTOURING_R, FINGER_BASE_CONTOURING_R), FINGER_BASE_CONTOURING_R, 180, 90)
            Line((0, FINGER_BASE_CONTOURING_R), (0, 0))
            Line((0, 0), (FINGER_BASE_CONTOURING_R, 0))
        make_face()
    extrude(amount=5.5, mode=Mode.SUBTRACT)
    with BuildSketch(Plane(origin=(-3.181980515, 23.424621202, 10), x_dir=(0, 0, -1), z_dir=(-0.707106781186549, -0.7071067811865462, -1.7763568394002497e-15))) as finger_base_contouring_2_piece_4:
        with BuildLine():
            CenterArc((FINGER_BASE_CONTOURING_R_2, FINGER_BASE_CONTOURING_R_2), FINGER_BASE_CONTOURING_R_2, 180, 90)
            Line((0, FINGER_BASE_CONTOURING_R_2), (0, 0))
            Line((0, 0), (FINGER_BASE_CONTOURING_R_2, 0))
        make_face()
    extrude(amount=12, mode=Mode.SUBTRACT)
    with BuildSketch(Plane(origin=(-11.66726189, 14.939339828, -10), x_dir=(0.707106781186546, -0.7071067811865489, 0), z_dir=(0.707106781186549, 0.7071067811865462, 0))) as finger_base_contouring_2_piece_5:
        with BuildLine():
            CenterArc((FINGER_BASE_CONTOURING_R_2, -FINGER_BASE_CONTOURING_R_2), FINGER_BASE_CONTOURING_R_2, 90, 90)
            Line((0, -FINGER_BASE_CONTOURING_R_2), (0, 0))
            Line((0, 0), (FINGER_BASE_CONTOURING_R_2, 0))
        make_face()
    extrude(amount=12, mode=Mode.SUBTRACT)
    with BuildSketch(Plane(origin=(0, 0, -16), x_dir=(1, 0, 0), z_dir=(0, 0, 1))) as finger_base_contouring_2_piece_6:
        with BuildLine():
            CenterArc((FINGER_BASE_CONTOURING_R_3, FINGER_BASE_CONTOURING_R_3), FINGER_BASE_CONTOURING_R_3, 180, 90)
            Line((0, FINGER_BASE_CONTOURING_R_3), (0, 0))
            Line((0, 0), (FINGER_BASE_CONTOURING_R_3, 0))
        make_face()
    extrude(amount=32, mode=Mode.SUBTRACT)
    with BuildSketch(Plane(origin=(19.8, 0, -7), x_dir=(0, 1, 0), z_dir=(0, 0, 1)), Plane(origin=(19.8, 0, -16), x_dir=(0, 1, 0), z_dir=(0, 0, 1))) as finger_base_contouring_2_piece_7:
        with BuildLine():
            CenterArc((FINGER_BASE_CONTOURING_R_3, FINGER_BASE_CONTOURING_R_3), FINGER_BASE_CONTOURING_R_3, 180, 90)
            Line((0, FINGER_BASE_CONTOURING_R_3), (0, 0))
            Line((0, 0), (FINGER_BASE_CONTOURING_R_3, 0))
        make_face()
    extrude(amount=23, mode=Mode.SUBTRACT)


solid = part.part
